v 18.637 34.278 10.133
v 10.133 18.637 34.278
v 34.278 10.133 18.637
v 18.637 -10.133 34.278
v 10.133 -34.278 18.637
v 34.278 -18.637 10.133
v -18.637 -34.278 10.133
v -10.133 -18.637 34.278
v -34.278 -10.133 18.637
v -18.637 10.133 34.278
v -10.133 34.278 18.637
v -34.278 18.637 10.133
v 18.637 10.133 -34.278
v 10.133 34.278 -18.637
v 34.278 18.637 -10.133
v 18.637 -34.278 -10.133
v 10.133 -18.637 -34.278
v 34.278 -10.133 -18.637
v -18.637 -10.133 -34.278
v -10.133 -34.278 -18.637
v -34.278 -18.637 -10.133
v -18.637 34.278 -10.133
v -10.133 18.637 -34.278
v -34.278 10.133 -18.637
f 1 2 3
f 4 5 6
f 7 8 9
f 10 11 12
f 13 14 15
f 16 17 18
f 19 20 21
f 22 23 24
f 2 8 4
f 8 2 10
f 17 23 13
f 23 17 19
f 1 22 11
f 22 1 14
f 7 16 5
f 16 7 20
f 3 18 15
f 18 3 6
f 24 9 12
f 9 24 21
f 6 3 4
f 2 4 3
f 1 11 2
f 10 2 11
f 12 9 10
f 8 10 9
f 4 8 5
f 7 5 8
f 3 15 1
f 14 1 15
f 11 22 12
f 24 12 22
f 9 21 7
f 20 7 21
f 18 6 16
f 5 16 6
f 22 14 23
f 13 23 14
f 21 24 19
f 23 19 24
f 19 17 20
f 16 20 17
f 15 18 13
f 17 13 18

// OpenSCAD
// Snub Cube
// (C) @oblomobka - 2023.06
// GPL license

/* **CUSTOMIZER VARIABLES** */
// Edge
edge = 30; // [10:100]
// Center of the solid or stand over a face
position = "Center"; // ["Center", "Face"]
// Chiral
chiral = "Laevo"; //["Laevo", "Dextro"]


/* **MODULES** */
// Created with tribonacci constant
module SnubCube ( edge = 20, position = "Face", chiral = "Laevo"){ //sC -> Conway notation 

    // Constants
    tri = (1+(19-3*sqrt(33))^(1/3)+(19+3*sqrt(33))^(1/3))/3;  // Tribonacci constant = 1,839...
    
    // Invariants
    rCirSnubCube = sqrt((1+1/tri^2)+tri^2);
    
    // Variables
    //factor2 = sqrt(2+4*tri-2*tri^2); // acording to Wikipedia
    factor = sqrt(2*(1+1/tri^2)); // =1,60972 
    scale = edge/factor;
    a= tri;
    
    // Definition of points and faces V = 24 / F = 38 ( 8+24 triangles + 6 squares )
    // Cartesian coordinates for the vertices of a snub cube are all the even permutations of(±1, ±1/tri, ±tri) with an even number of plus signs, along with all the odd permutations with an odd number of plus signs. Taking the even permutations with an odd number of plus signs, and the odd permutations with an even number of plus signs, gives a different snub cube, the mirror image. [Wikipedia]
    
    // Both simetric snub cubes are created with these points, even indexes build one, odd indexes the other one
    
    sCpoints=[  
        [ +a, +1, +1/a], [ +a, +1/a, +1], [ +1/a, +a, +1],
        [ +1, +a, +1/a], [ +1, +1/a, +a], [ +1/a, +1, +a],   // Corner triangles +X+Y+Z  [0-5]
    
        [ +a, -1/a, +1], [ +a, -1, +1/a], [ +1, -a, +1/a], 
        [ +1/a, -a, +1], [ +1/a, -1, +a], [ +1, -1/a, +a],   // Corner triangles +X-Y+Z  [6-11]
        
        [ -a, -1, +1/a], [ -a, -1/a, +1], [ -1/a, -a, +1],
        [ -1, -a, +1/a], [ -1, -1/a, +a], [ -1/a, -1, +a],   // Corner triangles -X-Y+Z  [12-17] 
        
        [ -a, +1/a, +1], [ -a, +1, +1/a], [ -1, +a, +1/a],
        [ -1/a, +a, +1], [ -1/a, +1, +a], [ -1, +1/a, +a],   // Corner triangles -X+Y+Z  [18-23]
    
        [ +a, +1/a, -1], [ +a, +1, -1/a], [ +1, +a, -1/a],
        [ +1/a, +a, -1], [ +1/a, +1, -a], [ +1, +1/a, -a],   // Corner triangles +X+Y-Z  [24-29]
        
        [ +a, -1, -1/a], [ +a, -1/a, -1], [ +1/a, -a, -1],
        [ +1, -a, -1/a], [ +1, -1/a, -a], [ +1/a, -1, -a],   // Corner triangles +X-Y-Z  [30-35]
        
        [ -a, -1/a, -1], [ -a, -1, -1/a], [ -1, -a, -1/a],
        [ -1/a, -a, -1], [ -1/a, -1, -a], [ -1, -1/a, -a],   // Corner triangles -X-Y-Z  [36-41] 
        
        [ -a, +1, -1/a], [ -a, +1/a, -1], [ -1/a, +a, -1],
        [ -1, +a, -1/a], [ -1, +1/a, -a], [ -1/a, +1, -a],   // Corner triangles -X+Y-Z  [42-47]        
        ];
        
    // Scub 1 - created with half of the points above described - odd index 
    sCfaceslaevo = [
        // Build 8 triangles. One triangle per octant
        [  1,  5,  3], [  7,  9, 11], [ 13, 17, 15], [ 19, 21, 23],     // Up
        [ 25, 27, 29], [ 31, 35, 33], [ 37, 39, 41], [ 43, 47, 45],     // Down
        
        // Squares        
        [  5, 11, 17, 23], [ 41, 35, 29, 47],   // parallel XY        
        [  3, 21, 45, 27], [ 15,  9, 33, 39],   // parallel XZ
        [  1, 25, 31,  7], [ 13, 37, 43, 19],   // parallel YZ
               
        // Other triangles
        [ 11,  1,  7], [  1, 11,  5],  [  5, 21,  3], [ 21,  5, 23],
        [ 23, 13, 19], [ 13, 23, 17],  [  9, 17, 11], [ 17,  9, 15],
        [  3, 25,  1], [ 25,  3, 27],  [ 19, 45, 21], [ 45, 19, 43],
        [ 15, 37, 13], [ 37, 15, 39],  [ 33,  7, 31], [  7, 33,  9],
        [ 47, 27, 45], [ 27, 47, 29],  [ 41, 43, 37], [ 43, 41, 47],
        [ 39, 35, 41], [ 35, 39, 33],  [ 29, 31, 25], [ 31, 29, 35]
      /*[  5,  7, 11], [  1,  7,  5],  [  3,  5, 23], [  3, 23, 21],
        [ 17, 19, 23], [ 13, 19, 17],  [ 11, 15, 17], [  9, 15, 11],
        [  1,  3, 27], [ 27, 25,  1],  [ 19, 43, 21], [ 43, 45, 21],
        [ 13, 15, 39], [ 37, 13, 39],  [  9,  7, 31], [  9, 31, 33],
        [ 45, 29, 27], [ 29, 45, 47],  [ 37, 47, 43], [ 47, 37, 41],
        [ 33, 41, 39], [ 41, 33, 35],  [ 35, 25, 29], [ 25, 35, 31]  */
        ];
        
    // Scub 2 - created with half of the points above described - even index
    sCfacesdextro = [  
        // Build 8 triangles. One triangle per octant
        [  0,  4,  2], [  6,  8, 10], [ 12, 16, 14], [ 18, 20, 22],     // Up
        [ 24, 26, 28], [ 30, 34, 32], [ 36, 38, 40], [ 42, 46, 44],     // Down
        
        // Squares        
        [  4, 10, 16, 22], [ 40, 34, 28, 46],   // parallel XY        
        [  2, 20, 44, 26], [ 14,  8, 32, 38],   // parallel XZ
        [  0, 24, 30,  6], [ 12, 36, 42, 18],   // parallel YZ
               
        // Other triangles
        [  4,  6, 10], [  0,  6,  4],  [  2,  4, 22], [  2, 22, 20],
        [ 16, 18, 22], [ 12, 18, 16],  [ 10, 14, 16], [  8, 14, 10],
        [  0,  2, 26], [ 26, 24,  0],  [ 18, 42, 20], [ 42, 44, 20],
        [ 12, 14, 38], [ 36, 12, 38],  [  8,  6, 30], [  8, 30, 32],
        [ 44, 28, 26], [ 28, 44, 46],  [ 36, 46, 42], [ 46, 36, 40],
        [ 32, 40, 38], [ 40, 32, 34],  [ 34, 24, 28], [ 24, 34, 30]  
        ];
  
    // Polyhedron stands on xy plane centered on the center of the face or centered on the center of polyhedron
    if ( chiral == "Laevo"){
        if ( position == "Face"){
            translate ([ 0, 0, scale*a])
                scale ([ scale, scale, scale])
                    polyhedron ( sCpoints, sCfaceslaevo);}
        else if ( position == "Center") {
            scale ([ scale, scale, scale]){
                polyhedron ( sCpoints, sCfaceslaevo);
                //color( "orange", 0.2 ) {sphere(rCirSnubCube);}}
            }
        }
    }
    else if ( chiral == "Dextro") {
        if ( position == "Face"){
            translate ([ 0, 0, scale*a])
                scale ([ scale, scale, scale])
                    polyhedron ( sCpoints, sCfacesdextro);}
        else if ( position == "Center") {
            scale ([ scale, scale, scale]){
                polyhedron ( sCpoints, sCfacesdextro);
                //color( "orange", 0.2 ) {sphere(rCirSnubCube);
                }      
        }       
    }
}

/* **RENDERING OF SOLIDS** */
SnubCube ( edge = edge, position = position, chiral = chiral);
